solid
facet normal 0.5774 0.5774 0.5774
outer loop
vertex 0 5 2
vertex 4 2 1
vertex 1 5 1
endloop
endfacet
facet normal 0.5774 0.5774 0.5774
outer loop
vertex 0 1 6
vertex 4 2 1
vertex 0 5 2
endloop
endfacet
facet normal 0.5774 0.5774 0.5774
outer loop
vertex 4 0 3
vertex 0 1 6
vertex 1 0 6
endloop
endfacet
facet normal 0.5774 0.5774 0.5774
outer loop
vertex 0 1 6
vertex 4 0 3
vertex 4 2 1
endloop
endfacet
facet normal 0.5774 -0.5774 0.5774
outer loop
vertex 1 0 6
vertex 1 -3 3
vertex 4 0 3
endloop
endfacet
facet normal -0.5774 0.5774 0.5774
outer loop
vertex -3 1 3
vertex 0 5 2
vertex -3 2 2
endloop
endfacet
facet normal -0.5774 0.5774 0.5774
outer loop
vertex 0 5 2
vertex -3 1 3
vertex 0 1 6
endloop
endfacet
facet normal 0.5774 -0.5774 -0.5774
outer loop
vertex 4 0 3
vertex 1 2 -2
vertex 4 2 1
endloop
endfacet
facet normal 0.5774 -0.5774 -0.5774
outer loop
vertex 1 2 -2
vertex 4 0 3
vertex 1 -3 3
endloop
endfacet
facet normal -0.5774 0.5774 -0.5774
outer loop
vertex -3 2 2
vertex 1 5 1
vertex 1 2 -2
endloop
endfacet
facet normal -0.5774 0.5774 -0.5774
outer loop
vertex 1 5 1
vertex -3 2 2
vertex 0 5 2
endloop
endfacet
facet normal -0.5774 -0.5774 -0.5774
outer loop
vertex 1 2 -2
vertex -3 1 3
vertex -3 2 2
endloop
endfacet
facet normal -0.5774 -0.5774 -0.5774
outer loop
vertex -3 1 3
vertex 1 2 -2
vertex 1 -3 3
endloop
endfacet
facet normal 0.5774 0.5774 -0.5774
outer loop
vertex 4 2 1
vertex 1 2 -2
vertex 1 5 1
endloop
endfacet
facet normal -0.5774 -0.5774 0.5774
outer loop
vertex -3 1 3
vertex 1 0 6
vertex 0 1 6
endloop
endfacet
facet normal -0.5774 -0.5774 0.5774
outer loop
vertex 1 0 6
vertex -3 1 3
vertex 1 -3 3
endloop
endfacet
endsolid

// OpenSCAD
module ManhattanSphere(size) {
    octahedron(size);
}

module octahedron(size) {
    polyhedron(
        points = [ [0,0,size], [0,size,0], [size,0,0], [0,-size,0], [-size,0,0], [0,0,-size] ],
        faces  = [ [0,1,2], [0,2,3], [0,3,4], [0,4,1], [5,3,2], [5,2,1], [5,1,4], [5,4,3] ]
    );
}

intersection() {
    ManhattanSphere(7);
    translate( [1,2,3] ) ManhattanSphere(5);
}
